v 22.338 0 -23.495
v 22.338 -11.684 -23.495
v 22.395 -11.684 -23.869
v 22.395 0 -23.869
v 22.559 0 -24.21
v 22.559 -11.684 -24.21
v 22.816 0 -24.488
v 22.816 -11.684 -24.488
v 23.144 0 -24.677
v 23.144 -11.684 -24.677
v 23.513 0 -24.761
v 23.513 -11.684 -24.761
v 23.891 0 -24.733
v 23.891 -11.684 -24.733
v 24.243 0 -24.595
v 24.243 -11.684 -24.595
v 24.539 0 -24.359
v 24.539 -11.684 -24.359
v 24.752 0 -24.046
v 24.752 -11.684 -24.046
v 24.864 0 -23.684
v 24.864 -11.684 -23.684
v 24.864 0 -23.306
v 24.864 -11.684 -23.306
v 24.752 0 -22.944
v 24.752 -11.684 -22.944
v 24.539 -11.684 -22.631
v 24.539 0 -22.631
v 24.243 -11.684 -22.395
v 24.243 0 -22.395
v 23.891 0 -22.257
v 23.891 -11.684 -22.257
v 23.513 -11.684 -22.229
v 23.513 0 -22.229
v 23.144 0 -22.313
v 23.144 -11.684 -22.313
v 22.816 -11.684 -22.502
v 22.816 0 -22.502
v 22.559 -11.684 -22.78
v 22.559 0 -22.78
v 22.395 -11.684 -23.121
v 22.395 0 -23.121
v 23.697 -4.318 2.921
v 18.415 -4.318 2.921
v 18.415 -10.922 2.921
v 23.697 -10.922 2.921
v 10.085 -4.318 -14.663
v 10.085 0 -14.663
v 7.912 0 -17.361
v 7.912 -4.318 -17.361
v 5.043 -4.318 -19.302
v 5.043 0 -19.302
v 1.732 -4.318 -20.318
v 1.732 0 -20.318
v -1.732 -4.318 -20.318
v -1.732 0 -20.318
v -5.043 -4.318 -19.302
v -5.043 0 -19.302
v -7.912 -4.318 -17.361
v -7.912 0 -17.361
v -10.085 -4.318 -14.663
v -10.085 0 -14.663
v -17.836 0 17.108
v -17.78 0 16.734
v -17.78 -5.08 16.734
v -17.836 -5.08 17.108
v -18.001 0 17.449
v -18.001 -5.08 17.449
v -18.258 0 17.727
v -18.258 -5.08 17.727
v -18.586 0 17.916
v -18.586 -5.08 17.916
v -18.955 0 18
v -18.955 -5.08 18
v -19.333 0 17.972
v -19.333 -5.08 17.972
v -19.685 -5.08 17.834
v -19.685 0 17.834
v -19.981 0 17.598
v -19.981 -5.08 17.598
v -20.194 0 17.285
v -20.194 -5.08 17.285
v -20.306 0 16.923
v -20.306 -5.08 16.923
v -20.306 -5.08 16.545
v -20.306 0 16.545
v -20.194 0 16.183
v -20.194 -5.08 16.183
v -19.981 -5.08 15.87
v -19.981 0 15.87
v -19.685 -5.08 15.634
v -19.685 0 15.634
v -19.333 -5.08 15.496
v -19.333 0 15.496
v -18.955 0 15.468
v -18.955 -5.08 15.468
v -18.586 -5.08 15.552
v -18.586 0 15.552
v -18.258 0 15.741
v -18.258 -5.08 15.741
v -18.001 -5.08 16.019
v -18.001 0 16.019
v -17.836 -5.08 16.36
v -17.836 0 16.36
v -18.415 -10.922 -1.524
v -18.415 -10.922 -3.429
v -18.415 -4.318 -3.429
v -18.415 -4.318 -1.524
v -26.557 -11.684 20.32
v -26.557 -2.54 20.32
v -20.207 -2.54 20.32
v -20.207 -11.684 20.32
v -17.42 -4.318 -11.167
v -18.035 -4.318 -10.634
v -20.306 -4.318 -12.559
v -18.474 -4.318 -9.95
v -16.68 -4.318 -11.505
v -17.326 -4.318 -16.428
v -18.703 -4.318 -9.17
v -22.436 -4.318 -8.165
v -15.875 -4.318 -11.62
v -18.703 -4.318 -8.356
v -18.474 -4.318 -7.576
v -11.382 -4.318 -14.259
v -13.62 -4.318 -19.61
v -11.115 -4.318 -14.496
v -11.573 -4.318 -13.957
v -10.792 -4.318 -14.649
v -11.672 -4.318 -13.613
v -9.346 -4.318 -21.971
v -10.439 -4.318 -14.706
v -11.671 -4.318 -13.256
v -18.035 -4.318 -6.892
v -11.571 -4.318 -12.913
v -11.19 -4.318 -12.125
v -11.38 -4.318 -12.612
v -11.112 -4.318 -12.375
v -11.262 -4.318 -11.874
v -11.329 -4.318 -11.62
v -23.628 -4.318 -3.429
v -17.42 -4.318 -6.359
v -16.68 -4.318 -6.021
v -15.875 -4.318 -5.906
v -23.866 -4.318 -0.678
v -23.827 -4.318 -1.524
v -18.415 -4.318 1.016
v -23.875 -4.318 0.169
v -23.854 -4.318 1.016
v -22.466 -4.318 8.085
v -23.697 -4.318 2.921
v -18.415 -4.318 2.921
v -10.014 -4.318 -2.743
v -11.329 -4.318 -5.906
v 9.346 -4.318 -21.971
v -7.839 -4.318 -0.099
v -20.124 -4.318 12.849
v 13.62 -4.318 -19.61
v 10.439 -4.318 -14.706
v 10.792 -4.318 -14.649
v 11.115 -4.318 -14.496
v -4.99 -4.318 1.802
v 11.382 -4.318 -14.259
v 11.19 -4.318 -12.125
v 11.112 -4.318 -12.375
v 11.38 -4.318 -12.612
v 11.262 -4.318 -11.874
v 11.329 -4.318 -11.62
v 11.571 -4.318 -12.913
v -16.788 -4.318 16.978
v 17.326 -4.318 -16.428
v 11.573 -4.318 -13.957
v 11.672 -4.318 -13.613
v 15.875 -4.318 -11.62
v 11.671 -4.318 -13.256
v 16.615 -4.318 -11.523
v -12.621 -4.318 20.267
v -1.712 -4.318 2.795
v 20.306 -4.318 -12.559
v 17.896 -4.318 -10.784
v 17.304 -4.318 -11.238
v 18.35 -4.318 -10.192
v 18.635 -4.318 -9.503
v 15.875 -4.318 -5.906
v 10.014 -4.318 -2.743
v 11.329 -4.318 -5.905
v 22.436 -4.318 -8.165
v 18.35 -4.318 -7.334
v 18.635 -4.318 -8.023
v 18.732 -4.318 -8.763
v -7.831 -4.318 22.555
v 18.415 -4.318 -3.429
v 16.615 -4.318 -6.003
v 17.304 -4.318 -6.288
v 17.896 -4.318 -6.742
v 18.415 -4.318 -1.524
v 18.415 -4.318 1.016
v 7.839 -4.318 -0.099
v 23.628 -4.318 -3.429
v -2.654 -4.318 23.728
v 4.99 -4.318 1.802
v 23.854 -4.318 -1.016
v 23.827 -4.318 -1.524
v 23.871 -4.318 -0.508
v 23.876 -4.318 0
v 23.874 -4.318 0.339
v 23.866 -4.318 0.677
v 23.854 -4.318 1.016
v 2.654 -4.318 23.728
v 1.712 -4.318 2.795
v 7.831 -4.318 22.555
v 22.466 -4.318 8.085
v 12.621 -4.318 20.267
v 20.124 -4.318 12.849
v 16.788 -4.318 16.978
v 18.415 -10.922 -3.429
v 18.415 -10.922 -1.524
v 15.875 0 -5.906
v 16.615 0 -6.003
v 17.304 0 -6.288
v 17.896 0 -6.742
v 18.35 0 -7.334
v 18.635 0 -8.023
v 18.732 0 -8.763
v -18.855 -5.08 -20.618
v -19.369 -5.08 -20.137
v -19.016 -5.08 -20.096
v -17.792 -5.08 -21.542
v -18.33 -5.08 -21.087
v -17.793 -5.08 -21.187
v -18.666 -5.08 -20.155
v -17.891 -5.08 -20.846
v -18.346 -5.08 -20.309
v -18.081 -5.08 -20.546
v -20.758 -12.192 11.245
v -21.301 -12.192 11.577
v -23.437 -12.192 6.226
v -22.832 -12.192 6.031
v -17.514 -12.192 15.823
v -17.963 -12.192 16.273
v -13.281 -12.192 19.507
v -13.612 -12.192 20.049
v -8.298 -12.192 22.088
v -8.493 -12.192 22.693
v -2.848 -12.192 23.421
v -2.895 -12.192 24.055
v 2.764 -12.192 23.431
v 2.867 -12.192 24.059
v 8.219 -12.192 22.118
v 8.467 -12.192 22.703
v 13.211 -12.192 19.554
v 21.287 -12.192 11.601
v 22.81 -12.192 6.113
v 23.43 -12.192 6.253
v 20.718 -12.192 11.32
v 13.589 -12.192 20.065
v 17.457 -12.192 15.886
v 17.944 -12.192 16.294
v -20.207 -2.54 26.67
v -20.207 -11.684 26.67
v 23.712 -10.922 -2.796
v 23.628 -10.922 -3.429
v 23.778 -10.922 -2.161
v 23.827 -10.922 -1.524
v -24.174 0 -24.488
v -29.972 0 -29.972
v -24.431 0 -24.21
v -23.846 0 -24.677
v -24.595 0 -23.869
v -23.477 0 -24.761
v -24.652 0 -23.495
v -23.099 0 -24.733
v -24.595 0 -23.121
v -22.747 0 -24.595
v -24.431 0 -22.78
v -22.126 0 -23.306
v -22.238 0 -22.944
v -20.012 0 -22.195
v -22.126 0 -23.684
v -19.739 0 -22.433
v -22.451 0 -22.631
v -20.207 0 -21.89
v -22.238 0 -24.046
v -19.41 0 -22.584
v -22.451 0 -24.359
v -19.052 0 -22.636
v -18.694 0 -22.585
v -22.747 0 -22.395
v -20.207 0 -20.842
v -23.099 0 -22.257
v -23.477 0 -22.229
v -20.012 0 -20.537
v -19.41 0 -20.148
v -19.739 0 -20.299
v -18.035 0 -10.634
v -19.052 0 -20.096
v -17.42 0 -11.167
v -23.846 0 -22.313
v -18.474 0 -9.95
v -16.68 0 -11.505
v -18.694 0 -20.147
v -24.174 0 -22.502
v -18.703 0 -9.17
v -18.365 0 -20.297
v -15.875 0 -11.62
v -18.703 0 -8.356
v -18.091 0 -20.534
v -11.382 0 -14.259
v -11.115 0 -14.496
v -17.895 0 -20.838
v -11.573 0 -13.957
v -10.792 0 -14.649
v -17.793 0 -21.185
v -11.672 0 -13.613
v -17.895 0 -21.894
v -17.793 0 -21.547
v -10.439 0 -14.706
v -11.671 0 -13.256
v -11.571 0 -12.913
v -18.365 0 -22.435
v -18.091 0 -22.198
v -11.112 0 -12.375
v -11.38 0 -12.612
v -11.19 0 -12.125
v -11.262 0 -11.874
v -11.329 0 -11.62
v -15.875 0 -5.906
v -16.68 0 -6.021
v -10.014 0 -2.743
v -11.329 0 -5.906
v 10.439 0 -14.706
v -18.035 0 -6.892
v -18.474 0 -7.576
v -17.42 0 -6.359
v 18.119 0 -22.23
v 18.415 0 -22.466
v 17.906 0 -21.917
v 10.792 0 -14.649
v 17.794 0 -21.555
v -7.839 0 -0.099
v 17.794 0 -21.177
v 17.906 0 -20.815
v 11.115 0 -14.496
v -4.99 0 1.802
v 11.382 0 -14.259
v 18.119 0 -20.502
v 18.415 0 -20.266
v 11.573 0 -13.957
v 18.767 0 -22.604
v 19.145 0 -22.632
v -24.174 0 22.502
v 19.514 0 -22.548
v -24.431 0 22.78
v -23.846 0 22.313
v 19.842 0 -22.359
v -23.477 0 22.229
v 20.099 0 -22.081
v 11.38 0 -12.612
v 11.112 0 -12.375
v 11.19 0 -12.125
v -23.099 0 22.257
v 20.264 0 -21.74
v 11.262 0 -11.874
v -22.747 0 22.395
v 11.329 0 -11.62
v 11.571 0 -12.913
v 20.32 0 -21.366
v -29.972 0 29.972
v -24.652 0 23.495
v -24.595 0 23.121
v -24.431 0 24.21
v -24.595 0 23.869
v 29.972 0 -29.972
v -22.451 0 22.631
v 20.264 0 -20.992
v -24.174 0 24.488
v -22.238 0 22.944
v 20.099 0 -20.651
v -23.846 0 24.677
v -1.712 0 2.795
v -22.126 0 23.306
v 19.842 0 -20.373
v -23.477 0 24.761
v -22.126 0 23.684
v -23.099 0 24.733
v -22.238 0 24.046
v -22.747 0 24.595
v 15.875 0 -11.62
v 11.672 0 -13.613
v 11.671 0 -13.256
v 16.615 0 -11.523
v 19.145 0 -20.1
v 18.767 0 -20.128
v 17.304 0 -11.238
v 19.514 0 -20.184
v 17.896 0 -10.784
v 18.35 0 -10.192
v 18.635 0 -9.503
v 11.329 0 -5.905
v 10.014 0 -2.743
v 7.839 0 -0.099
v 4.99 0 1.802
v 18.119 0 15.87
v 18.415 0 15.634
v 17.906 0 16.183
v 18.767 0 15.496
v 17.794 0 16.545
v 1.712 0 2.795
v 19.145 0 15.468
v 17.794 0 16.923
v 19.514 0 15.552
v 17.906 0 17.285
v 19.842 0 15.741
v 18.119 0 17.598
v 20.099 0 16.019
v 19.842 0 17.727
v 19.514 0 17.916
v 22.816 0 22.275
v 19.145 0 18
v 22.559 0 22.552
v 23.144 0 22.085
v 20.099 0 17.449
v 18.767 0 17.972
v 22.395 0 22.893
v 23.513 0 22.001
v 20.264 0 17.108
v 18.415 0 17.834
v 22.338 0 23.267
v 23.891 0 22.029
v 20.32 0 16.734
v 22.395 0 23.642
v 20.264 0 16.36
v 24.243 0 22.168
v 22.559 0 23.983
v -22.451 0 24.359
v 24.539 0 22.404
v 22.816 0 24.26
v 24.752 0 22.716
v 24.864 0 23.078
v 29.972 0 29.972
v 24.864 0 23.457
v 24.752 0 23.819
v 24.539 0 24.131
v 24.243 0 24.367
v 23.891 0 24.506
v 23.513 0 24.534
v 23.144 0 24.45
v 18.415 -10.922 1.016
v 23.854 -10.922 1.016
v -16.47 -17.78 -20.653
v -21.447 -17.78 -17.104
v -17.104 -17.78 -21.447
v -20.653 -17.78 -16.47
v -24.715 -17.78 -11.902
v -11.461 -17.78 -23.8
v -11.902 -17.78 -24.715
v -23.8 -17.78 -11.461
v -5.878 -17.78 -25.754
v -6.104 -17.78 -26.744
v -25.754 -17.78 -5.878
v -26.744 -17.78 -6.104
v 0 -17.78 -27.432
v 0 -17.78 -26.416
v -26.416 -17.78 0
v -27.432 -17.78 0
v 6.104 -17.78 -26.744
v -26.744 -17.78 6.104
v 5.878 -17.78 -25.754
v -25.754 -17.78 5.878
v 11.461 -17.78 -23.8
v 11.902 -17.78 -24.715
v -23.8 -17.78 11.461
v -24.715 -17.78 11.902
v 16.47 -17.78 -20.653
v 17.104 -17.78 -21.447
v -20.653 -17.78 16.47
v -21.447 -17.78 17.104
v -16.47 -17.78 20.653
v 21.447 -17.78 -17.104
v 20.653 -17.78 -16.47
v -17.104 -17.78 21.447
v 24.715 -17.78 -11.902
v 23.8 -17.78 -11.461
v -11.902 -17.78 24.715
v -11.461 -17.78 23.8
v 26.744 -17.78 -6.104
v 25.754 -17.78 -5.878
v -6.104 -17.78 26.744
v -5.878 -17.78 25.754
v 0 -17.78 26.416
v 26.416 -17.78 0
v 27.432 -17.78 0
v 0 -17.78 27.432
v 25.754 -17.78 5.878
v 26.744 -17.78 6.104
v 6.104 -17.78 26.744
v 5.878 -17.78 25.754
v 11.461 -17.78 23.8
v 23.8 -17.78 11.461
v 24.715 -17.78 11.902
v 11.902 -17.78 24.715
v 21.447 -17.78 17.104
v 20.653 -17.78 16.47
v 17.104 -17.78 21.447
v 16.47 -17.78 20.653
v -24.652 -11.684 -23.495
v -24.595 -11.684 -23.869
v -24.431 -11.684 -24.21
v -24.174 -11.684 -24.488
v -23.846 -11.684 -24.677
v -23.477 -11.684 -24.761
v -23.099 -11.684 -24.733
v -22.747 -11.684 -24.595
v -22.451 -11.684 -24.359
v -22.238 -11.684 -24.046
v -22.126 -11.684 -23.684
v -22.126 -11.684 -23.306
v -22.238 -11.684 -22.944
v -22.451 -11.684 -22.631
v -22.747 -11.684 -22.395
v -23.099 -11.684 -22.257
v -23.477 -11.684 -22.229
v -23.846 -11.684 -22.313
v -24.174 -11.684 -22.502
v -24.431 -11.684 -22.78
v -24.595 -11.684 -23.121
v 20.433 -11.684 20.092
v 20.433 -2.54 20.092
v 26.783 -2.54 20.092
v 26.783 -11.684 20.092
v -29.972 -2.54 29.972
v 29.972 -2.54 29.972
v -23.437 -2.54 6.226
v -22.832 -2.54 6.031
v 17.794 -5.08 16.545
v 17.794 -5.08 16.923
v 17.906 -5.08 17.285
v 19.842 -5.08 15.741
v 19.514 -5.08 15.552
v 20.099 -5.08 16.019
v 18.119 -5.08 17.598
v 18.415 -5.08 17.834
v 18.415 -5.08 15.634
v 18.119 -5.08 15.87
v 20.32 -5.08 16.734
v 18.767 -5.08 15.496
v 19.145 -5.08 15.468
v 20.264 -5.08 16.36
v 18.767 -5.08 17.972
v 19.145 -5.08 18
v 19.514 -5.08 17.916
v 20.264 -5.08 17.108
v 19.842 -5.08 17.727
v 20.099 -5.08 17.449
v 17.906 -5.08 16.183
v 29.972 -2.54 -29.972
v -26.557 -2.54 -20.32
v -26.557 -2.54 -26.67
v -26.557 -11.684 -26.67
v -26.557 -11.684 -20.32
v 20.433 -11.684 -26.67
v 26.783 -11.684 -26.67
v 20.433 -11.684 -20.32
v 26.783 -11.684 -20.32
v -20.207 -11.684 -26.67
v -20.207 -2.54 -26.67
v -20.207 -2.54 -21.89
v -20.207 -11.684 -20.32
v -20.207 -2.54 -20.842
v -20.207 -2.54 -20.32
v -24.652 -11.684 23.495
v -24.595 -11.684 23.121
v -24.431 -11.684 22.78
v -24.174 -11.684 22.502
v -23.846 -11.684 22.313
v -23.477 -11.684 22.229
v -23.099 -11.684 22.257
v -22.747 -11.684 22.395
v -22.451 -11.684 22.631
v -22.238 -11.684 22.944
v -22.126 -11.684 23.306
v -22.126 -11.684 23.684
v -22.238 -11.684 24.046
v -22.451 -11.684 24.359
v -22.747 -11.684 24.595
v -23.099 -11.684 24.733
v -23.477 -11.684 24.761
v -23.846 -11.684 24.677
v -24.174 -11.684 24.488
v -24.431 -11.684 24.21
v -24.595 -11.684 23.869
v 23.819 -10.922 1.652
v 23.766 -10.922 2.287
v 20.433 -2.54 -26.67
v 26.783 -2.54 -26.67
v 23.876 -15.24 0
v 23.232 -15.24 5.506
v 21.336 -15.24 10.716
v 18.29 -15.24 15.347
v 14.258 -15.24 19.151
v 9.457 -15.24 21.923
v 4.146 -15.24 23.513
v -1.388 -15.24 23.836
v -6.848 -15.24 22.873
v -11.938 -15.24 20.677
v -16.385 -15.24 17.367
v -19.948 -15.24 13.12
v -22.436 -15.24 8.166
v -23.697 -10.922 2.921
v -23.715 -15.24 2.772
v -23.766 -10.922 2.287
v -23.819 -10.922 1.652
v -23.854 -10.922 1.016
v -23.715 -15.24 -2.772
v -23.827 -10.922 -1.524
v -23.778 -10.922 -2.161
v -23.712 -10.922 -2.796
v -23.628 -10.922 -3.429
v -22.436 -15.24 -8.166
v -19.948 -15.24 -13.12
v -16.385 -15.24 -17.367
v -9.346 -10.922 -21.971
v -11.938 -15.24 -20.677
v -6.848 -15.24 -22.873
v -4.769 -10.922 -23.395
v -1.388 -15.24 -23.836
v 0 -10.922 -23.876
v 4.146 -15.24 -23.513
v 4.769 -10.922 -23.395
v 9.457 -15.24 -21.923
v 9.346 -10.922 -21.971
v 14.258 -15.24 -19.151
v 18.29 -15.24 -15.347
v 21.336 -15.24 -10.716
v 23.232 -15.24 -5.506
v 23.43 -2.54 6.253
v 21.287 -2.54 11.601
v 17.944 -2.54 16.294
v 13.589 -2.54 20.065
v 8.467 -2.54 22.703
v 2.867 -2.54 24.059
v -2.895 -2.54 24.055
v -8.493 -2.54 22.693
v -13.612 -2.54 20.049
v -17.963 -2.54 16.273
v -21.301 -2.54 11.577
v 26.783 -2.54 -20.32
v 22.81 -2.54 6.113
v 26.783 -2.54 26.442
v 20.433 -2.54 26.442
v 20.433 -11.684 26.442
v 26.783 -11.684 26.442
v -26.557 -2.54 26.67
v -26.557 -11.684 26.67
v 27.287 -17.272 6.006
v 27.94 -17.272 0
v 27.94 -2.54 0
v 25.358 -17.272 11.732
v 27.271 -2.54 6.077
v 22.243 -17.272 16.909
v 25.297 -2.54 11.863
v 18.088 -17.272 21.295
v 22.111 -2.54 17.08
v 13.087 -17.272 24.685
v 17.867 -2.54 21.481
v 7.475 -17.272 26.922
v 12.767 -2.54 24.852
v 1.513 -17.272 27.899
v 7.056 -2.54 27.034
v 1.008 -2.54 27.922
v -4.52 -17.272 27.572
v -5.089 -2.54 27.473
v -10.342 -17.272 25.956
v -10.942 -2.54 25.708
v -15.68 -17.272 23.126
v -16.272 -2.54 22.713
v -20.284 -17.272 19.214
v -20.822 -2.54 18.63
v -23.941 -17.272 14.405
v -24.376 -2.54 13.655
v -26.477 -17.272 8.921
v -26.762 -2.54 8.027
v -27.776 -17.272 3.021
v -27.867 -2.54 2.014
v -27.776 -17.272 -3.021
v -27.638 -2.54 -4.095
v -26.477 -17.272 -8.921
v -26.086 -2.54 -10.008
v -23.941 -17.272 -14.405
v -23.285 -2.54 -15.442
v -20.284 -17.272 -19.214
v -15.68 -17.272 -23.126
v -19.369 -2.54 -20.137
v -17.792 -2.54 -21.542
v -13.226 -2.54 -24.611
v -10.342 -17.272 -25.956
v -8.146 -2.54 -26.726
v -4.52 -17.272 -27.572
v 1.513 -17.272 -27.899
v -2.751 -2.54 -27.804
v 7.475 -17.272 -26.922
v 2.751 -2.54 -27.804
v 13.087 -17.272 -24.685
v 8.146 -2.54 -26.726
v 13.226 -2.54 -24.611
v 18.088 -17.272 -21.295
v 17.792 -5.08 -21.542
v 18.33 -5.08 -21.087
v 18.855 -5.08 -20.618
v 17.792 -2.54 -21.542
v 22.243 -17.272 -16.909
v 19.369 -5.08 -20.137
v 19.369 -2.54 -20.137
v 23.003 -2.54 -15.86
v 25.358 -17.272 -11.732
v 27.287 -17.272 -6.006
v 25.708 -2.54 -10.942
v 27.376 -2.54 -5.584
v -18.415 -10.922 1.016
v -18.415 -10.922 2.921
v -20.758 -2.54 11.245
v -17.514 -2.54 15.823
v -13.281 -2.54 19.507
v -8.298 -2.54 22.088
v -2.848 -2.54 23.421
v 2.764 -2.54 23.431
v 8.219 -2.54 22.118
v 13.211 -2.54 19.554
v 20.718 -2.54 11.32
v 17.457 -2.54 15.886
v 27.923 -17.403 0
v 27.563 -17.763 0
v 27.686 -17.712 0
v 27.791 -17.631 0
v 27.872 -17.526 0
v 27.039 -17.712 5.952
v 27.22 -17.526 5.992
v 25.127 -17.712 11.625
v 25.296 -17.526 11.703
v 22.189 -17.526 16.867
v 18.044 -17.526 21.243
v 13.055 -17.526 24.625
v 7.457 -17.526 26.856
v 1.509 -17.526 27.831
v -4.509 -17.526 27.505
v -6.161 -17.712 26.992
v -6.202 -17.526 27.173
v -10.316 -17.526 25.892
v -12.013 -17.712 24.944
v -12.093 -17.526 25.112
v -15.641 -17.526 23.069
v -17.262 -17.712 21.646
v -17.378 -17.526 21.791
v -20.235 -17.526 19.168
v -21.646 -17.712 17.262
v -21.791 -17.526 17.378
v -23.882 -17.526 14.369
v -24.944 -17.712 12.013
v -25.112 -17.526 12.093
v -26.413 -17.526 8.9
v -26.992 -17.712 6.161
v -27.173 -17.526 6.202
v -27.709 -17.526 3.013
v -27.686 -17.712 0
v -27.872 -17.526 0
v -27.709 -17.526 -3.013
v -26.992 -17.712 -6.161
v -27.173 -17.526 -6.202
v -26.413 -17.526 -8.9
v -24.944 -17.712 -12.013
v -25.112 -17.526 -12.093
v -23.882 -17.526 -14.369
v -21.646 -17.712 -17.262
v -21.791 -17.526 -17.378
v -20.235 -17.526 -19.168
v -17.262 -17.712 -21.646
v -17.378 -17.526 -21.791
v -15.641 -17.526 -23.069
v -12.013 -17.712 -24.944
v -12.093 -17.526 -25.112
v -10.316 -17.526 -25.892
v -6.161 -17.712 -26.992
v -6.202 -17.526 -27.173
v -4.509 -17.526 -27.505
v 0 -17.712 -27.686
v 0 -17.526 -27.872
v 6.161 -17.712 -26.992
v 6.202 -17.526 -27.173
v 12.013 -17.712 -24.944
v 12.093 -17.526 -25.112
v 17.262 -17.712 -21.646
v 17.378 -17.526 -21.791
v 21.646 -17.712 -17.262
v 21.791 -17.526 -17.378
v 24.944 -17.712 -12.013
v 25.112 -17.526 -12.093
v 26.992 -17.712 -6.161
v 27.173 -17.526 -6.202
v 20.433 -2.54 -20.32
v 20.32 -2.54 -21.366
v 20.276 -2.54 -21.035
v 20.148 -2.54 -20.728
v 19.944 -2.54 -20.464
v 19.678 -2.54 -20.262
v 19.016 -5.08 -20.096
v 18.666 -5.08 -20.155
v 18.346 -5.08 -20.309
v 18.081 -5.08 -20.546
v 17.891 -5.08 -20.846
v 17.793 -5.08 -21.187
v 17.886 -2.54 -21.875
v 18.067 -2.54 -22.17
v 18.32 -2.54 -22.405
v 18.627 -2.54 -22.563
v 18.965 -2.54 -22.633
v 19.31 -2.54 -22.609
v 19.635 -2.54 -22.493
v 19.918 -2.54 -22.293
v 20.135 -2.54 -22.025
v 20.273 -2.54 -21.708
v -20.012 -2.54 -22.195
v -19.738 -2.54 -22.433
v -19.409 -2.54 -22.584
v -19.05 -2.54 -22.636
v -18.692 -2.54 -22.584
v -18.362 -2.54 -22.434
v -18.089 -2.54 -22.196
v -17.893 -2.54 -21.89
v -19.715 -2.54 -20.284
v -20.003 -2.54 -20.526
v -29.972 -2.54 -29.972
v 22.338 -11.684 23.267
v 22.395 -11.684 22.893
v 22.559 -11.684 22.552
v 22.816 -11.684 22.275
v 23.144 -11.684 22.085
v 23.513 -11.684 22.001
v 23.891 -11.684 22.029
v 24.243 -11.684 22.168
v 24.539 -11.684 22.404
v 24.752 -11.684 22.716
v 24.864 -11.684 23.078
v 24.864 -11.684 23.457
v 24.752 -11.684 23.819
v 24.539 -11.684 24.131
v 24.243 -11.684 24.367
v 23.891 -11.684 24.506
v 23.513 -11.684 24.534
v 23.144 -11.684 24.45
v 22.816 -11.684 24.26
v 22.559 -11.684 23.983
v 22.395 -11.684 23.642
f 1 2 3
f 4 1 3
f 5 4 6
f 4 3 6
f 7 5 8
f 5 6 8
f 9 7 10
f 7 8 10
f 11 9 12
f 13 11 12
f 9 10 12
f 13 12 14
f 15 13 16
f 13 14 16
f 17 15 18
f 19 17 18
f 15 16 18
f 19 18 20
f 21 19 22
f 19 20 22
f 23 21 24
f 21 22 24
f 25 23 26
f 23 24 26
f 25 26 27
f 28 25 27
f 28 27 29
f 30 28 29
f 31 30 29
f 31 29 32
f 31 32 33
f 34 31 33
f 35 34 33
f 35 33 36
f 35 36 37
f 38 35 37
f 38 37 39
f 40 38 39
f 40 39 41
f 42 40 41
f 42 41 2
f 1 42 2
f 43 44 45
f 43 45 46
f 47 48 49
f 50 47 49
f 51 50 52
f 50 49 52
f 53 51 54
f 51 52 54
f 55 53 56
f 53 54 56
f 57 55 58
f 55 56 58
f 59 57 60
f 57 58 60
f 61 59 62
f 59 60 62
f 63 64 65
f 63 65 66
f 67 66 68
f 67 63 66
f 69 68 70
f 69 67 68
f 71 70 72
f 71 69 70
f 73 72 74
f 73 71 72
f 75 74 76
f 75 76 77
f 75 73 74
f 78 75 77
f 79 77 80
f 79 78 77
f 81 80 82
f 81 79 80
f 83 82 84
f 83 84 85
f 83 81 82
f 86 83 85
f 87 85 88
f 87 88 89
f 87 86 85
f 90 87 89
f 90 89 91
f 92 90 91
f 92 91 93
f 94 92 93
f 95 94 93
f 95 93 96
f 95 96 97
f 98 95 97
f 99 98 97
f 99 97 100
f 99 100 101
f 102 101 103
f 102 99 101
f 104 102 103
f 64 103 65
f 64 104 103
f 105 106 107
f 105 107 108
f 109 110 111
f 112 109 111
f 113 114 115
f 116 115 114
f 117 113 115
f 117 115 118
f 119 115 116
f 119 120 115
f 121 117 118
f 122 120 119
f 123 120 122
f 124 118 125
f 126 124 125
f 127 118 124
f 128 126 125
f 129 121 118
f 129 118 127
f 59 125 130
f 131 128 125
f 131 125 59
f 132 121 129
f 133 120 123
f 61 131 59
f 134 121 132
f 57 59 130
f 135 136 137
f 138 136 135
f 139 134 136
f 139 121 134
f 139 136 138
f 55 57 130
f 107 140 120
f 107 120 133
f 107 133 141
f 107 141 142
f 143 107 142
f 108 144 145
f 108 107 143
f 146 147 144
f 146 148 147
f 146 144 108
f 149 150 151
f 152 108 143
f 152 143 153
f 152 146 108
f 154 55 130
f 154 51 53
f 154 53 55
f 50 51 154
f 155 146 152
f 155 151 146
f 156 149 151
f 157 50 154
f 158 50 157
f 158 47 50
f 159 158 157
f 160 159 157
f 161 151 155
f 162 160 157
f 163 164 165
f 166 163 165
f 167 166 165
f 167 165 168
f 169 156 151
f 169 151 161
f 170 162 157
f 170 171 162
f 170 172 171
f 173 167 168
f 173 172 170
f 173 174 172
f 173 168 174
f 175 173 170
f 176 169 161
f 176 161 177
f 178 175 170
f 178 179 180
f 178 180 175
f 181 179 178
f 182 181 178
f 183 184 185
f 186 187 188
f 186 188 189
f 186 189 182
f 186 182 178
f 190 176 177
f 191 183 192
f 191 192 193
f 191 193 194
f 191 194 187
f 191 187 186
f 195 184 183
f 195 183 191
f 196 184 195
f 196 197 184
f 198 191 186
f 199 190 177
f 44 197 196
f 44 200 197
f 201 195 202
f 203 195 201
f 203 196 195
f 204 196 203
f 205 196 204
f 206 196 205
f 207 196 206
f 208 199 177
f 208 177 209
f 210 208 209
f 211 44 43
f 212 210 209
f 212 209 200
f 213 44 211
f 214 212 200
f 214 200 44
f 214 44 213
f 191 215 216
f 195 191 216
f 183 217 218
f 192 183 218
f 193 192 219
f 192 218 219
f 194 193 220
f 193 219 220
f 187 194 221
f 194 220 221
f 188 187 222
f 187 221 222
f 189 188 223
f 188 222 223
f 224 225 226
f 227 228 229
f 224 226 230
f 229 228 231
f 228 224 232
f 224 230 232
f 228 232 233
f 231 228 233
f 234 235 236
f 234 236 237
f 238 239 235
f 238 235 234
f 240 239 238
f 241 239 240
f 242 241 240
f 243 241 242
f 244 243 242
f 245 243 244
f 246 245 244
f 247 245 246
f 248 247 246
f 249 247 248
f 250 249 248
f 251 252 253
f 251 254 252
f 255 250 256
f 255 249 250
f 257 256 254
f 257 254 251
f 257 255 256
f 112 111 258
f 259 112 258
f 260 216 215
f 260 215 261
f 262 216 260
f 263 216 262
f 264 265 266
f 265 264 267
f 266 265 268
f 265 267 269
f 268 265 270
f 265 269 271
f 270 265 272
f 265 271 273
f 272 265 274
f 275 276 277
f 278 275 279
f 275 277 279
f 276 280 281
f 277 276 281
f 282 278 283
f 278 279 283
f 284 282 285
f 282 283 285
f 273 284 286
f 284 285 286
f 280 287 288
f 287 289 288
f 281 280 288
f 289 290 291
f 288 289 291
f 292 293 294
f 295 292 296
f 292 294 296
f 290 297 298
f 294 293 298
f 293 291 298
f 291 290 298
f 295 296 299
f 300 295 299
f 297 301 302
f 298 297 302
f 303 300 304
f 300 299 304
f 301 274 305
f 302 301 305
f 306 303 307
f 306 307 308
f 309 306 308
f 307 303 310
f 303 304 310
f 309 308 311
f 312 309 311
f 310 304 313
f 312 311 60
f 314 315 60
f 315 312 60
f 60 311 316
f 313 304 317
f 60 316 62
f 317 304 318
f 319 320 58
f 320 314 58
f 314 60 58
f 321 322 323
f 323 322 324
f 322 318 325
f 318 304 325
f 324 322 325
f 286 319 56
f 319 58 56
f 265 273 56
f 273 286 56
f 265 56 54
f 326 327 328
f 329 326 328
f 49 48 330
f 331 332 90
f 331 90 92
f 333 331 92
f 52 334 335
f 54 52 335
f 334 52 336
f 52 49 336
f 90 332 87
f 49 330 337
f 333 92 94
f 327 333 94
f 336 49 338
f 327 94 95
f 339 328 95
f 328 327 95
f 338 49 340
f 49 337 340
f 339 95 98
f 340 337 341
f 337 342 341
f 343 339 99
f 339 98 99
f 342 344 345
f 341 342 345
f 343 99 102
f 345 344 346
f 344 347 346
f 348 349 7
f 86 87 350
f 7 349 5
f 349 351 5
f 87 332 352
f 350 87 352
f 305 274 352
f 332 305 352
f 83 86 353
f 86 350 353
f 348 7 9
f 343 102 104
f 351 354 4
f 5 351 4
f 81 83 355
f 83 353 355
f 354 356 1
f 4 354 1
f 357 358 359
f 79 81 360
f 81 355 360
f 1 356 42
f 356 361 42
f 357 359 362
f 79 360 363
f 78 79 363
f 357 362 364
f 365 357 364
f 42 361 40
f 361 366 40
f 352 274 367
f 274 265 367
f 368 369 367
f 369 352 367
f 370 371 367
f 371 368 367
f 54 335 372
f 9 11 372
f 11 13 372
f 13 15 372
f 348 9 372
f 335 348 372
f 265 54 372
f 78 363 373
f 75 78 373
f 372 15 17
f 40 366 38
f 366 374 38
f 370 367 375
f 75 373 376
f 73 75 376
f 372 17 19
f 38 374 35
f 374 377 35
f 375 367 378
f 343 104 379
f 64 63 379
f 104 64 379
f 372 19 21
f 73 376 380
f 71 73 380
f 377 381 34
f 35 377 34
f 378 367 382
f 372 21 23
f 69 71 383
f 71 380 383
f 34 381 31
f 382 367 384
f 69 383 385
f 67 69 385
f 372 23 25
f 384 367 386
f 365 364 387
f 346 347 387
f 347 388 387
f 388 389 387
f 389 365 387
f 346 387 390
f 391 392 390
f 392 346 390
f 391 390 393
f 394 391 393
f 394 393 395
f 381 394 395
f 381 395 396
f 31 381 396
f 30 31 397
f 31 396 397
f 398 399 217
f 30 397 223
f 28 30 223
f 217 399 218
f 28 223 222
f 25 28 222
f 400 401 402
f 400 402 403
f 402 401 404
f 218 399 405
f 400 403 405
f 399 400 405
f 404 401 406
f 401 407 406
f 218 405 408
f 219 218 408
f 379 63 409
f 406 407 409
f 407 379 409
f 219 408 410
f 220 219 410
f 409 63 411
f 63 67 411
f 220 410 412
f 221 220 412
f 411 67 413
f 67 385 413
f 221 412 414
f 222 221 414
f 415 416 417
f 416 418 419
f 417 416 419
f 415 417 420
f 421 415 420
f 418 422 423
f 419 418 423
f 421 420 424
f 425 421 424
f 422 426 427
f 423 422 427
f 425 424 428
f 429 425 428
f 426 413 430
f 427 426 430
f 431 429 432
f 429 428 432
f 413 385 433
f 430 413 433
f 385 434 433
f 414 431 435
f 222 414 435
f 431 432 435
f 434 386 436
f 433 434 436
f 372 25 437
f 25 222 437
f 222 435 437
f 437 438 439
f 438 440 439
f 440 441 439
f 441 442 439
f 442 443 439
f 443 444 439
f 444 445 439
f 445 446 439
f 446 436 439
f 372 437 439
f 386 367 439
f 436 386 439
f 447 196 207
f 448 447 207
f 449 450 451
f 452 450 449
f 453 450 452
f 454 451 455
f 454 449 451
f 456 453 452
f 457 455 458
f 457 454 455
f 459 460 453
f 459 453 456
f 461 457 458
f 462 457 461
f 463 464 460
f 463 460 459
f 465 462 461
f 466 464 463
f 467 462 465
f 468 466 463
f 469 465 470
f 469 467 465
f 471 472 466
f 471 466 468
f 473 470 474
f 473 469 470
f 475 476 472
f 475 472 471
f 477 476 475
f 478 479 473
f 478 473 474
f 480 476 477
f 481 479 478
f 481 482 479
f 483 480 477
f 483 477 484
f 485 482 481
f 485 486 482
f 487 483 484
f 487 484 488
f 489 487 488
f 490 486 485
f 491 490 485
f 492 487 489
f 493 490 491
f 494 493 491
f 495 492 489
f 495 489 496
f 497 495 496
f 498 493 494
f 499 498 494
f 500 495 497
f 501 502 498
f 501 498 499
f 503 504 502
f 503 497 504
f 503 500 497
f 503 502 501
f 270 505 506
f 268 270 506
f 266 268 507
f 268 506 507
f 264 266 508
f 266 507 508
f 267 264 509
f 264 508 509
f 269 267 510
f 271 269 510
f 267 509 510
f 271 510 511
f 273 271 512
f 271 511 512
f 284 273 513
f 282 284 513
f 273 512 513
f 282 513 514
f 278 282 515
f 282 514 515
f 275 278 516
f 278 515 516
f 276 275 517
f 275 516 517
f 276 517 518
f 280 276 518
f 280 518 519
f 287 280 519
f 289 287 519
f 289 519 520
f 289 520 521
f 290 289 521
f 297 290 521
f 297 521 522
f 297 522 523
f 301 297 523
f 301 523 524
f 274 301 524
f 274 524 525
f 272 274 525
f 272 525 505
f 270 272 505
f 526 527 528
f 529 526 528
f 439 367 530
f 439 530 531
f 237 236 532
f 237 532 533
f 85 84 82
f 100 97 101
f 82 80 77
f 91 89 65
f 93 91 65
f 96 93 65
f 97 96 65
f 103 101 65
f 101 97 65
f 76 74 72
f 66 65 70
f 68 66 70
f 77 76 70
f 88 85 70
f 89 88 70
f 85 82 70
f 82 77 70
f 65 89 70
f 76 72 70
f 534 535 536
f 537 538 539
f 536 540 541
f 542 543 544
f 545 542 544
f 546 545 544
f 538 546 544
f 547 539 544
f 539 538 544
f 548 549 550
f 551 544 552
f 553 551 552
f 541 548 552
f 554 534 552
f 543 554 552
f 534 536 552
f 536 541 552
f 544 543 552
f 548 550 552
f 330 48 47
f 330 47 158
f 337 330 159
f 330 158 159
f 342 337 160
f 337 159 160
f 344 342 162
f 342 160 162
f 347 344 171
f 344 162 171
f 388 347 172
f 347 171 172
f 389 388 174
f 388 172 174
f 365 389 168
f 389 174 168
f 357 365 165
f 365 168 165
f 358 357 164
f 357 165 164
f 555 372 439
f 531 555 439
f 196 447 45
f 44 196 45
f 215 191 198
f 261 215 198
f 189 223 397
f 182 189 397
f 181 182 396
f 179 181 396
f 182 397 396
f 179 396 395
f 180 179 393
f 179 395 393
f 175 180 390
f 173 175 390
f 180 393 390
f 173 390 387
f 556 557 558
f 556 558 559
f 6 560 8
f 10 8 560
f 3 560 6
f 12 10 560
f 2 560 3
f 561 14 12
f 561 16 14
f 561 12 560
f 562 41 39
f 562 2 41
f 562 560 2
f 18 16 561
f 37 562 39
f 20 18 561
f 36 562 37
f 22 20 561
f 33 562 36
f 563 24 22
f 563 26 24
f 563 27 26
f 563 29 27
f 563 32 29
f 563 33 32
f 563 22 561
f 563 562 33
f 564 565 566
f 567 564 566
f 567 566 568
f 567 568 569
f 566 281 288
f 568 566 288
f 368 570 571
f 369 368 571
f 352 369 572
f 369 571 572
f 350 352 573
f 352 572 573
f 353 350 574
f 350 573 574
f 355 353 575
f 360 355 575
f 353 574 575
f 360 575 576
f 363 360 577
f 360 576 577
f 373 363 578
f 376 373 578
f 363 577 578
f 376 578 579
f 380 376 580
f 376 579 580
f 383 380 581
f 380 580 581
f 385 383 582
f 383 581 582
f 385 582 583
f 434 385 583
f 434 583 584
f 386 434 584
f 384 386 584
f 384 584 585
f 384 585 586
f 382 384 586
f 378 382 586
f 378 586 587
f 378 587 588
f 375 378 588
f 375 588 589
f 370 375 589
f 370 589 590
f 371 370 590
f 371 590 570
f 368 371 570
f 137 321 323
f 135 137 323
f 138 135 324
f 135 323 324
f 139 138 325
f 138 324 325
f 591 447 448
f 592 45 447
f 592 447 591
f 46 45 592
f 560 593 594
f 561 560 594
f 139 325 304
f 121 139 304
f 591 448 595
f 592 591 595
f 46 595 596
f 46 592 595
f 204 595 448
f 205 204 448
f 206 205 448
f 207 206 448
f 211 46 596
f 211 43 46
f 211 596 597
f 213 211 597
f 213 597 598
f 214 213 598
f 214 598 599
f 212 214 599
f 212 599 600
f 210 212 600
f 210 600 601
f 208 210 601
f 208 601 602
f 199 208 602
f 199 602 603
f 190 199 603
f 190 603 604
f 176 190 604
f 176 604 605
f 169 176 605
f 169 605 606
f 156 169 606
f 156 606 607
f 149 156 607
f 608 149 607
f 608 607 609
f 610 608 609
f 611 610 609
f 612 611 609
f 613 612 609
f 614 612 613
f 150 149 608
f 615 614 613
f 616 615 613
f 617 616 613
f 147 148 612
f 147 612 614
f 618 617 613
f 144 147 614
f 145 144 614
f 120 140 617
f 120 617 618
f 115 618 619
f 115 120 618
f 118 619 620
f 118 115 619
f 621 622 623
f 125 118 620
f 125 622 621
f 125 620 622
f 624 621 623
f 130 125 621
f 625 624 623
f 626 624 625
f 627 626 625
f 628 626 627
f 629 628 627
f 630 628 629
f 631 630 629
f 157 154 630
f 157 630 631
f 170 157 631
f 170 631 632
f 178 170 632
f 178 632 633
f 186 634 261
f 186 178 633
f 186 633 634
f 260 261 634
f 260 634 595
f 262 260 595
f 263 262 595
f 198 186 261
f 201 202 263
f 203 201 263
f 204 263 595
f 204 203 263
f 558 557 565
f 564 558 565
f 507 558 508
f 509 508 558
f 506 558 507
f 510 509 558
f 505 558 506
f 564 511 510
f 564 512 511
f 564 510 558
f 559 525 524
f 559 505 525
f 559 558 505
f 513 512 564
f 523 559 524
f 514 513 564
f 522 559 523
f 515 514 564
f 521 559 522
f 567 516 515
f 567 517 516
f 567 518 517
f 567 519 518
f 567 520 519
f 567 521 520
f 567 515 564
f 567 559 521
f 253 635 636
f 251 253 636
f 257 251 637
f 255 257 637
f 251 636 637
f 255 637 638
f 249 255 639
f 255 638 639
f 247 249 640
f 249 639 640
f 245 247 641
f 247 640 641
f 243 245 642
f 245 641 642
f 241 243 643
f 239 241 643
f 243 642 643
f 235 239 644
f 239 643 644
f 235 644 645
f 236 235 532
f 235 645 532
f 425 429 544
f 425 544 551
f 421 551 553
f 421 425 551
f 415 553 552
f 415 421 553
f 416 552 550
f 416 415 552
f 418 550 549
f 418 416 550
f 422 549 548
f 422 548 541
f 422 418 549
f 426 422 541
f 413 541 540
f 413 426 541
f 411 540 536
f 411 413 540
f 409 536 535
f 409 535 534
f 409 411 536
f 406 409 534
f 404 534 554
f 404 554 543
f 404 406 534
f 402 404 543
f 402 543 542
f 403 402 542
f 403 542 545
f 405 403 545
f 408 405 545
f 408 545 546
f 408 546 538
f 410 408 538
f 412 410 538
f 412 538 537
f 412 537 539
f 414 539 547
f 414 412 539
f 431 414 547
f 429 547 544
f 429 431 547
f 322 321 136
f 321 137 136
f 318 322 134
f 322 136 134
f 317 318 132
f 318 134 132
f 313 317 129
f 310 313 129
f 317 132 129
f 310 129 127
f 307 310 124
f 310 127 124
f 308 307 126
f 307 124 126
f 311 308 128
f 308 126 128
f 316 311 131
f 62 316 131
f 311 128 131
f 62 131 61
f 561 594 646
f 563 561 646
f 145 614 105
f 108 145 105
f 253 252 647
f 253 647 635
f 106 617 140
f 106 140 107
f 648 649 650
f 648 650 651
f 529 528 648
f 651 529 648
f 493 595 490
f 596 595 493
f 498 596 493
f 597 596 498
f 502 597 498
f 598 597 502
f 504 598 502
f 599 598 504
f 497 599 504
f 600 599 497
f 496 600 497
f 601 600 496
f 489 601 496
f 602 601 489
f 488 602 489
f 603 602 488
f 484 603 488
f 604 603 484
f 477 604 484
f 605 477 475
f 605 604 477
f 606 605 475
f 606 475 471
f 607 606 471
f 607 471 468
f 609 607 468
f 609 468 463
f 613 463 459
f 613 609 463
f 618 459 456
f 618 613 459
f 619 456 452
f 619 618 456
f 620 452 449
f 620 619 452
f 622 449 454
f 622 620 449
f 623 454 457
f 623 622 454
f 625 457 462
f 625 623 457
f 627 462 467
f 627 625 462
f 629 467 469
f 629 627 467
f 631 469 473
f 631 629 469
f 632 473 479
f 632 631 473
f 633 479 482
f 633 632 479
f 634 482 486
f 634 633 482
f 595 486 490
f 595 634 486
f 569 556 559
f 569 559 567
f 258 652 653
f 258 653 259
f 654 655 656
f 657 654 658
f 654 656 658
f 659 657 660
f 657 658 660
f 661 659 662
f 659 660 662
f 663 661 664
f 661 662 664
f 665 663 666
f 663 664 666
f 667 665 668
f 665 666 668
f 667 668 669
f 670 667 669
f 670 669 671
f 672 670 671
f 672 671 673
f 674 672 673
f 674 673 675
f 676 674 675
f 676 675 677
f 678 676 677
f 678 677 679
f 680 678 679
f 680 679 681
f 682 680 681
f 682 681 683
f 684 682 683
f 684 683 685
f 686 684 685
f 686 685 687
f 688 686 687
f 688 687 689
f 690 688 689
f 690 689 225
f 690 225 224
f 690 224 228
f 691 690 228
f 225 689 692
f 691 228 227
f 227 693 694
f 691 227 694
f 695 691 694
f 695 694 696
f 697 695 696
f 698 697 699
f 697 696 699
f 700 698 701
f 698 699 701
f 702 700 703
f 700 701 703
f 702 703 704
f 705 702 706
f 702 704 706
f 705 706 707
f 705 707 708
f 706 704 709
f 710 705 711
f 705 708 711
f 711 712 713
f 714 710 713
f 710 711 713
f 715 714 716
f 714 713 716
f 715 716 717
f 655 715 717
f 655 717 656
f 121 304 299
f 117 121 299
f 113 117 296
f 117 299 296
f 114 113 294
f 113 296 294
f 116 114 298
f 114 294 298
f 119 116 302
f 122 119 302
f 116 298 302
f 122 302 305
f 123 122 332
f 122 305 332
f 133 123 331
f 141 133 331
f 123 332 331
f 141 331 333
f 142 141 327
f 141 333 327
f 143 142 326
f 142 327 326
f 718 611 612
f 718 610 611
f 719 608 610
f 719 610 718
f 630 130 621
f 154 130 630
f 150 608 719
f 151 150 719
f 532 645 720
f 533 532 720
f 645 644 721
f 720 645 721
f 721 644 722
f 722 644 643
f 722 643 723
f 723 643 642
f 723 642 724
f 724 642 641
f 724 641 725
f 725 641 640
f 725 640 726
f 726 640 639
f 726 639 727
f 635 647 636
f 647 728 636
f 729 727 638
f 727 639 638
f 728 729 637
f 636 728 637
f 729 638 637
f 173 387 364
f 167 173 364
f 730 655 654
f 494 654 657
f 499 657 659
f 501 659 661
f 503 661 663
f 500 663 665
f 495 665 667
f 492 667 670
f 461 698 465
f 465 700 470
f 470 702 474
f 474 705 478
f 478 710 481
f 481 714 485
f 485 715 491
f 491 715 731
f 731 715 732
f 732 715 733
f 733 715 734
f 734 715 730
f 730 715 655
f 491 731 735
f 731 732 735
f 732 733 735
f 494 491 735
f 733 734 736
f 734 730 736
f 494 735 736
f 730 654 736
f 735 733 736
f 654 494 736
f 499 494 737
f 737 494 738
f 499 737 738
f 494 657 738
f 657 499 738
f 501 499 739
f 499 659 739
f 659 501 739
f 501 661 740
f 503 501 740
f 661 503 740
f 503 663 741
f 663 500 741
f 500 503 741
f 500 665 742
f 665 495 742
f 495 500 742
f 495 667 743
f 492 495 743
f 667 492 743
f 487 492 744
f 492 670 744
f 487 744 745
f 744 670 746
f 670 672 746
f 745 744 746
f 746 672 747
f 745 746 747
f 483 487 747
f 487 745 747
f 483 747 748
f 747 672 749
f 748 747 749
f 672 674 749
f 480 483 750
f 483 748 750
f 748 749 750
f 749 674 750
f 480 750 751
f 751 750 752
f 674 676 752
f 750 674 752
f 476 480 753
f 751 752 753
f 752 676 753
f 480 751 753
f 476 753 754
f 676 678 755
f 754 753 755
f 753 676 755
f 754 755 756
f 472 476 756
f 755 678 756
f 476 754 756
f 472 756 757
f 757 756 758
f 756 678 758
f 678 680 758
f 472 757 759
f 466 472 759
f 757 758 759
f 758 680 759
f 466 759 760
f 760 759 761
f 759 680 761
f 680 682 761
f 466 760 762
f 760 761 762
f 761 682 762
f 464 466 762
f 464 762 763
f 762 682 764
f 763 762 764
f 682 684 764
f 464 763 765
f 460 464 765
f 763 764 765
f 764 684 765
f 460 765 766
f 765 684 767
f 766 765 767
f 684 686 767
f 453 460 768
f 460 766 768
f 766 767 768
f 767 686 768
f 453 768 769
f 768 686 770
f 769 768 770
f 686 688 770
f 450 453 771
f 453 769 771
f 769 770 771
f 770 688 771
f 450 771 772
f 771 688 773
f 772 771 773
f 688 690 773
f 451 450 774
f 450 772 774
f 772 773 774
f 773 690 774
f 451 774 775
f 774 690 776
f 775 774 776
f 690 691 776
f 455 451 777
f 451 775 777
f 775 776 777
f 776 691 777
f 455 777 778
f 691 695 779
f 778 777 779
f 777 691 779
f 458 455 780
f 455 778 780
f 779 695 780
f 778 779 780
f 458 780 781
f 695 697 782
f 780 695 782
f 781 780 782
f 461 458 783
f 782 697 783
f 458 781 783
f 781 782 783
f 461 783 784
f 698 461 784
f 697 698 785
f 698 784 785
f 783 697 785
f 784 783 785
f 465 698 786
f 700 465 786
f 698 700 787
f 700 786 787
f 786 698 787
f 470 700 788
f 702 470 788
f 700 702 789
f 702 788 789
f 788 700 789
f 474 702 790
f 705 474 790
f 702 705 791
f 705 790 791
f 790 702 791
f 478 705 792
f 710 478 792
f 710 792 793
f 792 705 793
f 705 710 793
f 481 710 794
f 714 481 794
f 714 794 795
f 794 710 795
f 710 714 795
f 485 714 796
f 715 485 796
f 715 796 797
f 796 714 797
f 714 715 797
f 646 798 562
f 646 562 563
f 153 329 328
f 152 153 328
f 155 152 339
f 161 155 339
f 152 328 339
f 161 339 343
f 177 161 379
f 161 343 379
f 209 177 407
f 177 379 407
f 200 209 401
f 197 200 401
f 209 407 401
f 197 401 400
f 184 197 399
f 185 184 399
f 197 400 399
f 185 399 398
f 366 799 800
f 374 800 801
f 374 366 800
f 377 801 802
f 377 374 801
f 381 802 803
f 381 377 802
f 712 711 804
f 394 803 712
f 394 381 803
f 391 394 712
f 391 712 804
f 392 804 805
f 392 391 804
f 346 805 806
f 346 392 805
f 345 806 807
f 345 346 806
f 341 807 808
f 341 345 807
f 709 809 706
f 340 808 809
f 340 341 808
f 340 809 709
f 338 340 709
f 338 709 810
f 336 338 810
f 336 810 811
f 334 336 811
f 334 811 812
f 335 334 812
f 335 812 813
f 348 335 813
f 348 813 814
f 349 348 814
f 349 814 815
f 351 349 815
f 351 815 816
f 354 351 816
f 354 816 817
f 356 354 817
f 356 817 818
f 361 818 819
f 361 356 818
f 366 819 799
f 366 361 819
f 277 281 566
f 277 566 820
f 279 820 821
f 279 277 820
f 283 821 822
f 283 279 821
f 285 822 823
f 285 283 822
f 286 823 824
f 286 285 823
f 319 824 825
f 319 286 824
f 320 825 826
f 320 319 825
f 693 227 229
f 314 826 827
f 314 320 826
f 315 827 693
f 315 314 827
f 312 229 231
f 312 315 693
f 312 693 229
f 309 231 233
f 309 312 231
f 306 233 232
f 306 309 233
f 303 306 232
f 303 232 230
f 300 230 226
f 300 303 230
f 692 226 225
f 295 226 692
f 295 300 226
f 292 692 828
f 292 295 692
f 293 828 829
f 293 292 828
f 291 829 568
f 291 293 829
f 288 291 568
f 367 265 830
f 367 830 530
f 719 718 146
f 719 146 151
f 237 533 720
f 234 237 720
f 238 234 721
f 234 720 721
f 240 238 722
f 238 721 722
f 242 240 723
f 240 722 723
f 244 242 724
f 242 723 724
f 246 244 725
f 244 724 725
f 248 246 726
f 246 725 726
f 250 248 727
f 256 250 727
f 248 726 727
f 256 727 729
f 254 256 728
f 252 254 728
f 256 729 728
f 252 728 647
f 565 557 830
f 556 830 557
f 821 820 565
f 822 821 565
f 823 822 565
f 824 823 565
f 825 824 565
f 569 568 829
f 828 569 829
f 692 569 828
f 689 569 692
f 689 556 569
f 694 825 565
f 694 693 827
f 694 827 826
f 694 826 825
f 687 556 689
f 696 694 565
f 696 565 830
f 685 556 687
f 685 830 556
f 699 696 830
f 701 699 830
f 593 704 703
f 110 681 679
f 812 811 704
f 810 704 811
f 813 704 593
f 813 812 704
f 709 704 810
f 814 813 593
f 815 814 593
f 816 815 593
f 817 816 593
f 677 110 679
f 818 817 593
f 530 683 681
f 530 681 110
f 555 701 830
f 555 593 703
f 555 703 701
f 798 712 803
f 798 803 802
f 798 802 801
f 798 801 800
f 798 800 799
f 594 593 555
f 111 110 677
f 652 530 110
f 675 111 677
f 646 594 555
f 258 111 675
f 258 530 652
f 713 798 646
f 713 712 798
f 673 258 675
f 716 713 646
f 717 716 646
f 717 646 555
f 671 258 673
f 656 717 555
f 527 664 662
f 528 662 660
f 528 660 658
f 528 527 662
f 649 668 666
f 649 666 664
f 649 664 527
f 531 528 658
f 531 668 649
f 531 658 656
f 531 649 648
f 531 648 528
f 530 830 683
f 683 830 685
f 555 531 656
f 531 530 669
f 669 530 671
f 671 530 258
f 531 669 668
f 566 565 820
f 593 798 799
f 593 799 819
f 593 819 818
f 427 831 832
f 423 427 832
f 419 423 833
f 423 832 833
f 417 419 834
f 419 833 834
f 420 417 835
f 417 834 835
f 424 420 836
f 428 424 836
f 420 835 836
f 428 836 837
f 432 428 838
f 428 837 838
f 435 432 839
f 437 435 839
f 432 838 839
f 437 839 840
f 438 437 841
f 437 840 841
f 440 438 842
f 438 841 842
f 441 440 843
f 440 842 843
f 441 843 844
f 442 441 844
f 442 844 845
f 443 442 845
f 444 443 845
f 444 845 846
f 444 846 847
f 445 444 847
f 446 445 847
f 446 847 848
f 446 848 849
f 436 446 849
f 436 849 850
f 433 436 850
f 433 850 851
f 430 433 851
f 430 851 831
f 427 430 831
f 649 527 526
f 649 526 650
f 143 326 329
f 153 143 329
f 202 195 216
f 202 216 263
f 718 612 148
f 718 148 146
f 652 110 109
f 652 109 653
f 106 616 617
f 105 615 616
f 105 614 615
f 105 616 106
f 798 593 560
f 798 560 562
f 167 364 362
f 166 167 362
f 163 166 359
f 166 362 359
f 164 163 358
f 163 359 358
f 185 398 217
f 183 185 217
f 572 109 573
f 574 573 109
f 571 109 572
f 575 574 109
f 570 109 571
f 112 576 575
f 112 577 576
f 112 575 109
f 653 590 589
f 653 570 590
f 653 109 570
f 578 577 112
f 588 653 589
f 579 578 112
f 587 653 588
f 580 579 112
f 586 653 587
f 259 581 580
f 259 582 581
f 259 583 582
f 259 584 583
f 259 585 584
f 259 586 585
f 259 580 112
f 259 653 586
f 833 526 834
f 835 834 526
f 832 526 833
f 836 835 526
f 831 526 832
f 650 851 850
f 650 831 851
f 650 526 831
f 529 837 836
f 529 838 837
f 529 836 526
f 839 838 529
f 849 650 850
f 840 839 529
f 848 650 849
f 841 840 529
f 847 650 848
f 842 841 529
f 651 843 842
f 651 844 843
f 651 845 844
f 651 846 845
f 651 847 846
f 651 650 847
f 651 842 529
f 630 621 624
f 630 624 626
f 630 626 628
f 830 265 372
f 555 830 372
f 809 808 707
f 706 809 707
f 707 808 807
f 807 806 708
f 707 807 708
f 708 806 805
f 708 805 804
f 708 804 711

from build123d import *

# Parameters (mm, degrees)
F0_R      = 24.257
F1_DEPTH  = 4.318
F2_D      = 2.54
F3_DEPTH  = 10.922
F4_R      = 27.94
F4_R_2    = 23.876
F5_DEPTH  = 17.78
F0_W      = 59.944
F0_H      = 59.944
F0_W_2    = 6.35
F0_H_2    = 6.35
F8_DEPTH  = 2.54
F10_DEPTH = 9.652
F11_R     = 1.27
F12_DEPTH = 5.08
F7_W      = 25.4
F7_H      = 2.54
F7_W_2    = 6.35
F7_H_2    = 1.905
F13_DEPTH = 8.382
F14_DEPTH = 11.684
F15_D     = 2.54
F16_SIZE  = 2.54
F17_R     = 0.508


with BuildPart() as f1:
    # F0 (on Front) → F1 (new body)
    with BuildSketch(Plane.XZ):
        Circle(F0_R)
        with BuildLine():
            ThreePointArc((-11.329190163, -5.9055), (0, 2.921), (11.329190163, -5.9055))
            Line((11.329190163, -5.9055), (15.875, -5.9055))
            ThreePointArc((15.875, -5.9055), (17.8955576272, -6.7424423728), (18.7325, -8.763))
            ThreePointArc((18.7325, -8.763), (17.8955576272, -10.7835576272), (15.875, -11.6205))
            Line((15.875, -11.6205), (11.329190163, -11.6205))
            ThreePointArc((11.329190163, -11.6205), (0, -20.447), (-11.329190163, -11.6205))
            Line((-11.329190163, -11.6205), (-15.875, -11.6205))
            ThreePointArc((-15.875, -11.6205), (-18.7325, -8.763), (-15.875, -5.9055))
            Line((-15.875, -5.9055), (-11.329190163, -5.9055))
        make_face(mode=Mode.SUBTRACT)
    extrude(amount=F1_DEPTH)

    # F2 (through all)
    with Locations(Plane(origin=(0, 0, 0), x_dir=(1, 0, 0), z_dir=(0, 1, 0))):
        with Locations((-10.414, 13.4366), (10.414, 13.4366)):
            Hole(F2_D / 2)

    # F0 (on Front) → F3 (cut)
    with BuildSketch(Plane.XZ):
        Circle(F0_R)
        with BuildLine():
            ThreePointArc((-11.329190163, -5.9055), (0, 2.921), (11.329190163, -5.9055))
            Line((11.329190163, -5.9055), (15.875, -5.9055))
            ThreePointArc((15.875, -5.9055), (17.8955576272, -6.7424423728), (18.7325, -8.763))
            ThreePointArc((18.7325, -8.763), (17.8955576272, -10.7835576272), (15.875, -11.6205))
            Line((15.875, -11.6205), (11.329190163, -11.6205))
            ThreePointArc((11.329190163, -11.6205), (0, -20.447), (-11.329190163, -11.6205))
            Line((-11.329190163, -11.6205), (-15.875, -11.6205))
            ThreePointArc((-15.875, -11.6205), (-18.7325, -8.763), (-15.875, -5.9055))
            Line((-15.875, -5.9055), (-11.329190163, -5.9055))
        make_face(mode=Mode.SUBTRACT)
        with BuildLine():
            ThreePointArc((-13.0175, -8.763), (-13.8544423728, -6.7424423728), (-15.875, -5.9055))
            Line((-15.875, -5.9055), (-15.875, -11.6205))
            ThreePointArc((-15.875, -11.6205), (-13.8544423728, -10.7835576272), (-13.0175, -8.763))
        make_face()
        with BuildLine():
            Line((-15.875, -11.6205), (-15.875, -5.9055))
            ThreePointArc((-15.875, -5.9055), (-18.7325, -8.763), (-15.875, -11.6205))
        make_face()
        with BuildLine():
            Line((15.875, -11.6205), (15.875, -5.9055))
            ThreePointArc((15.875, -5.9055), (13.0175, -8.763), (15.875, -11.6205))
        make_face()
        with BuildLine():
            ThreePointArc((18.7325, -8.763), (17.8955576272, -6.7424423728), (15.875, -5.9055))
            Line((15.875, -5.9055), (15.875, -11.6205))
            ThreePointArc((15.875, -11.6205), (17.8955576272, -10.7835576272), (18.7325, -8.763))
        make_face()
    extrude(amount=-F3_DEPTH, mode=Mode.SUBTRACT)

    # F4 (on Front) → F5 (join)
    with BuildSketch(Plane.XZ):
        Circle(F4_R)
        Circle(F4_R_2, mode=Mode.SUBTRACT)
    extrude(amount=F5_DEPTH)

    # F0 (on Front) → F8 (join)
    with BuildSketch(Plane.XZ):
        Rectangle(F0_W, F0_H)
        with Locations((-23.3818002729, -23.495)):
            Rectangle(F0_W_2, F0_H_2, mode=Mode.SUBTRACT)
        Circle(F0_R, mode=Mode.SUBTRACT)
        with Locations((23.6081997271, -23.495)):
            Rectangle(F0_W_2, F0_H_2, mode=Mode.SUBTRACT)
        with Locations((-23.3818002729, 23.495)):
            Rectangle(F0_W_2, F0_H_2, mode=Mode.SUBTRACT)
        with Locations((23.6081997271, 23.2674991059)):
            Rectangle(F0_W_2, F0_H_2, mode=Mode.SUBTRACT)
    extrude(amount=F8_DEPTH)

    # F11 (on Front) → F12 (cut)
    with BuildSketch(Plane.XZ):
        with Locations((19.05, 16.7340026)):
            Circle(F11_R)
        with Locations((-19.05, 16.7340026)):
            Circle(F11_R)
        with Locations((-19.05, -21.3659974)):
            Circle(F11_R)
        with Locations((19.05, -21.3659974)):
            Circle(F11_R)
    extrude(amount=F12_DEPTH, mode=Mode.SUBTRACT)

    # F7 (on offset) → F13 (join)
    with BuildSketch(Plane.XZ.offset(2.54)):
        with Locations((0, -23.241)):
            Rectangle(F7_W, F7_H)
        with Locations((-21.59, 1.9685)):
            Rectangle(F7_W_2, F7_H_2)
        with Locations((-21.59, -2.4765)):
            Rectangle(F7_W_2, F7_H_2)
        with Locations((21.59, -2.4765)):
            Rectangle(F7_W_2, F7_H_2)
        with Locations((21.59, 1.9685)):
            Rectangle(F7_W_2, F7_H_2)
    extrude(amount=F13_DEPTH)

    # F0 (on Front) → F14 (join)
    with BuildSketch(Plane.XZ):
        with Locations((-23.3818002729, -23.495)):
            Rectangle(F0_W_2, F0_H_2)
        with Locations((-23.3818002729, 23.495)):
            Rectangle(F0_W_2, F0_H_2)
        with Locations((23.6081997271, 23.2674991059)):
            Rectangle(F0_W_2, F0_H_2)
        with Locations((23.6081997271, -23.495)):
            Rectangle(F0_W_2, F0_H_2)
    extrude(amount=F14_DEPTH)

    # F15 (through all)
    with Locations(Plane(origin=(0, 0, 0), x_dir=(1, 0, 0), z_dir=(0, 1, 0))):
        with Locations((-23.3818002729, -23.495), (23.6081997271, -23.2674991059), (-23.3818002729, 23.495), (23.6081997271, 23.495)):
            Hole(F15_D / 2)

    # F16
    f16_edges = [f1.edges().sort_by_distance(p)[0] for p in [
        (-23.876, -17.78, 0),
    ]]
    chamfer(f16_edges, length=F16_SIZE)

    # F17
    f17_edges = [f1.edges().sort_by_distance(p)[0] for p in [
        (-27.94, -17.78, 0),
    ]]
    fillet(f17_edges, radius=F17_R)


with BuildPart() as f10:
    # F9 (on offset) → F10 (new body)
    with BuildSketch(Plane.XZ.offset(2.54)):
        with BuildLine():
            Line((22.8097548437, 6.1129368152), (23.4296390158, 6.2530125087))
            ThreePointArc((23.4296390158, 6.2530125087), (-0.0140705905, 24.2286998006), (-23.4368858608, 6.2257950758))
            Line((-23.4368858608, 6.2257950758), (-22.8315827941, 6.0311575344))
            ThreePointArc((-22.8315827941, 6.0311575344), (-0.0423088793, 23.5936664159), (22.8097548437, 6.1129368152))
        make_face()
    extrude(amount=F10_DEPTH)


solid = Compound([f1.part, f10.part])
